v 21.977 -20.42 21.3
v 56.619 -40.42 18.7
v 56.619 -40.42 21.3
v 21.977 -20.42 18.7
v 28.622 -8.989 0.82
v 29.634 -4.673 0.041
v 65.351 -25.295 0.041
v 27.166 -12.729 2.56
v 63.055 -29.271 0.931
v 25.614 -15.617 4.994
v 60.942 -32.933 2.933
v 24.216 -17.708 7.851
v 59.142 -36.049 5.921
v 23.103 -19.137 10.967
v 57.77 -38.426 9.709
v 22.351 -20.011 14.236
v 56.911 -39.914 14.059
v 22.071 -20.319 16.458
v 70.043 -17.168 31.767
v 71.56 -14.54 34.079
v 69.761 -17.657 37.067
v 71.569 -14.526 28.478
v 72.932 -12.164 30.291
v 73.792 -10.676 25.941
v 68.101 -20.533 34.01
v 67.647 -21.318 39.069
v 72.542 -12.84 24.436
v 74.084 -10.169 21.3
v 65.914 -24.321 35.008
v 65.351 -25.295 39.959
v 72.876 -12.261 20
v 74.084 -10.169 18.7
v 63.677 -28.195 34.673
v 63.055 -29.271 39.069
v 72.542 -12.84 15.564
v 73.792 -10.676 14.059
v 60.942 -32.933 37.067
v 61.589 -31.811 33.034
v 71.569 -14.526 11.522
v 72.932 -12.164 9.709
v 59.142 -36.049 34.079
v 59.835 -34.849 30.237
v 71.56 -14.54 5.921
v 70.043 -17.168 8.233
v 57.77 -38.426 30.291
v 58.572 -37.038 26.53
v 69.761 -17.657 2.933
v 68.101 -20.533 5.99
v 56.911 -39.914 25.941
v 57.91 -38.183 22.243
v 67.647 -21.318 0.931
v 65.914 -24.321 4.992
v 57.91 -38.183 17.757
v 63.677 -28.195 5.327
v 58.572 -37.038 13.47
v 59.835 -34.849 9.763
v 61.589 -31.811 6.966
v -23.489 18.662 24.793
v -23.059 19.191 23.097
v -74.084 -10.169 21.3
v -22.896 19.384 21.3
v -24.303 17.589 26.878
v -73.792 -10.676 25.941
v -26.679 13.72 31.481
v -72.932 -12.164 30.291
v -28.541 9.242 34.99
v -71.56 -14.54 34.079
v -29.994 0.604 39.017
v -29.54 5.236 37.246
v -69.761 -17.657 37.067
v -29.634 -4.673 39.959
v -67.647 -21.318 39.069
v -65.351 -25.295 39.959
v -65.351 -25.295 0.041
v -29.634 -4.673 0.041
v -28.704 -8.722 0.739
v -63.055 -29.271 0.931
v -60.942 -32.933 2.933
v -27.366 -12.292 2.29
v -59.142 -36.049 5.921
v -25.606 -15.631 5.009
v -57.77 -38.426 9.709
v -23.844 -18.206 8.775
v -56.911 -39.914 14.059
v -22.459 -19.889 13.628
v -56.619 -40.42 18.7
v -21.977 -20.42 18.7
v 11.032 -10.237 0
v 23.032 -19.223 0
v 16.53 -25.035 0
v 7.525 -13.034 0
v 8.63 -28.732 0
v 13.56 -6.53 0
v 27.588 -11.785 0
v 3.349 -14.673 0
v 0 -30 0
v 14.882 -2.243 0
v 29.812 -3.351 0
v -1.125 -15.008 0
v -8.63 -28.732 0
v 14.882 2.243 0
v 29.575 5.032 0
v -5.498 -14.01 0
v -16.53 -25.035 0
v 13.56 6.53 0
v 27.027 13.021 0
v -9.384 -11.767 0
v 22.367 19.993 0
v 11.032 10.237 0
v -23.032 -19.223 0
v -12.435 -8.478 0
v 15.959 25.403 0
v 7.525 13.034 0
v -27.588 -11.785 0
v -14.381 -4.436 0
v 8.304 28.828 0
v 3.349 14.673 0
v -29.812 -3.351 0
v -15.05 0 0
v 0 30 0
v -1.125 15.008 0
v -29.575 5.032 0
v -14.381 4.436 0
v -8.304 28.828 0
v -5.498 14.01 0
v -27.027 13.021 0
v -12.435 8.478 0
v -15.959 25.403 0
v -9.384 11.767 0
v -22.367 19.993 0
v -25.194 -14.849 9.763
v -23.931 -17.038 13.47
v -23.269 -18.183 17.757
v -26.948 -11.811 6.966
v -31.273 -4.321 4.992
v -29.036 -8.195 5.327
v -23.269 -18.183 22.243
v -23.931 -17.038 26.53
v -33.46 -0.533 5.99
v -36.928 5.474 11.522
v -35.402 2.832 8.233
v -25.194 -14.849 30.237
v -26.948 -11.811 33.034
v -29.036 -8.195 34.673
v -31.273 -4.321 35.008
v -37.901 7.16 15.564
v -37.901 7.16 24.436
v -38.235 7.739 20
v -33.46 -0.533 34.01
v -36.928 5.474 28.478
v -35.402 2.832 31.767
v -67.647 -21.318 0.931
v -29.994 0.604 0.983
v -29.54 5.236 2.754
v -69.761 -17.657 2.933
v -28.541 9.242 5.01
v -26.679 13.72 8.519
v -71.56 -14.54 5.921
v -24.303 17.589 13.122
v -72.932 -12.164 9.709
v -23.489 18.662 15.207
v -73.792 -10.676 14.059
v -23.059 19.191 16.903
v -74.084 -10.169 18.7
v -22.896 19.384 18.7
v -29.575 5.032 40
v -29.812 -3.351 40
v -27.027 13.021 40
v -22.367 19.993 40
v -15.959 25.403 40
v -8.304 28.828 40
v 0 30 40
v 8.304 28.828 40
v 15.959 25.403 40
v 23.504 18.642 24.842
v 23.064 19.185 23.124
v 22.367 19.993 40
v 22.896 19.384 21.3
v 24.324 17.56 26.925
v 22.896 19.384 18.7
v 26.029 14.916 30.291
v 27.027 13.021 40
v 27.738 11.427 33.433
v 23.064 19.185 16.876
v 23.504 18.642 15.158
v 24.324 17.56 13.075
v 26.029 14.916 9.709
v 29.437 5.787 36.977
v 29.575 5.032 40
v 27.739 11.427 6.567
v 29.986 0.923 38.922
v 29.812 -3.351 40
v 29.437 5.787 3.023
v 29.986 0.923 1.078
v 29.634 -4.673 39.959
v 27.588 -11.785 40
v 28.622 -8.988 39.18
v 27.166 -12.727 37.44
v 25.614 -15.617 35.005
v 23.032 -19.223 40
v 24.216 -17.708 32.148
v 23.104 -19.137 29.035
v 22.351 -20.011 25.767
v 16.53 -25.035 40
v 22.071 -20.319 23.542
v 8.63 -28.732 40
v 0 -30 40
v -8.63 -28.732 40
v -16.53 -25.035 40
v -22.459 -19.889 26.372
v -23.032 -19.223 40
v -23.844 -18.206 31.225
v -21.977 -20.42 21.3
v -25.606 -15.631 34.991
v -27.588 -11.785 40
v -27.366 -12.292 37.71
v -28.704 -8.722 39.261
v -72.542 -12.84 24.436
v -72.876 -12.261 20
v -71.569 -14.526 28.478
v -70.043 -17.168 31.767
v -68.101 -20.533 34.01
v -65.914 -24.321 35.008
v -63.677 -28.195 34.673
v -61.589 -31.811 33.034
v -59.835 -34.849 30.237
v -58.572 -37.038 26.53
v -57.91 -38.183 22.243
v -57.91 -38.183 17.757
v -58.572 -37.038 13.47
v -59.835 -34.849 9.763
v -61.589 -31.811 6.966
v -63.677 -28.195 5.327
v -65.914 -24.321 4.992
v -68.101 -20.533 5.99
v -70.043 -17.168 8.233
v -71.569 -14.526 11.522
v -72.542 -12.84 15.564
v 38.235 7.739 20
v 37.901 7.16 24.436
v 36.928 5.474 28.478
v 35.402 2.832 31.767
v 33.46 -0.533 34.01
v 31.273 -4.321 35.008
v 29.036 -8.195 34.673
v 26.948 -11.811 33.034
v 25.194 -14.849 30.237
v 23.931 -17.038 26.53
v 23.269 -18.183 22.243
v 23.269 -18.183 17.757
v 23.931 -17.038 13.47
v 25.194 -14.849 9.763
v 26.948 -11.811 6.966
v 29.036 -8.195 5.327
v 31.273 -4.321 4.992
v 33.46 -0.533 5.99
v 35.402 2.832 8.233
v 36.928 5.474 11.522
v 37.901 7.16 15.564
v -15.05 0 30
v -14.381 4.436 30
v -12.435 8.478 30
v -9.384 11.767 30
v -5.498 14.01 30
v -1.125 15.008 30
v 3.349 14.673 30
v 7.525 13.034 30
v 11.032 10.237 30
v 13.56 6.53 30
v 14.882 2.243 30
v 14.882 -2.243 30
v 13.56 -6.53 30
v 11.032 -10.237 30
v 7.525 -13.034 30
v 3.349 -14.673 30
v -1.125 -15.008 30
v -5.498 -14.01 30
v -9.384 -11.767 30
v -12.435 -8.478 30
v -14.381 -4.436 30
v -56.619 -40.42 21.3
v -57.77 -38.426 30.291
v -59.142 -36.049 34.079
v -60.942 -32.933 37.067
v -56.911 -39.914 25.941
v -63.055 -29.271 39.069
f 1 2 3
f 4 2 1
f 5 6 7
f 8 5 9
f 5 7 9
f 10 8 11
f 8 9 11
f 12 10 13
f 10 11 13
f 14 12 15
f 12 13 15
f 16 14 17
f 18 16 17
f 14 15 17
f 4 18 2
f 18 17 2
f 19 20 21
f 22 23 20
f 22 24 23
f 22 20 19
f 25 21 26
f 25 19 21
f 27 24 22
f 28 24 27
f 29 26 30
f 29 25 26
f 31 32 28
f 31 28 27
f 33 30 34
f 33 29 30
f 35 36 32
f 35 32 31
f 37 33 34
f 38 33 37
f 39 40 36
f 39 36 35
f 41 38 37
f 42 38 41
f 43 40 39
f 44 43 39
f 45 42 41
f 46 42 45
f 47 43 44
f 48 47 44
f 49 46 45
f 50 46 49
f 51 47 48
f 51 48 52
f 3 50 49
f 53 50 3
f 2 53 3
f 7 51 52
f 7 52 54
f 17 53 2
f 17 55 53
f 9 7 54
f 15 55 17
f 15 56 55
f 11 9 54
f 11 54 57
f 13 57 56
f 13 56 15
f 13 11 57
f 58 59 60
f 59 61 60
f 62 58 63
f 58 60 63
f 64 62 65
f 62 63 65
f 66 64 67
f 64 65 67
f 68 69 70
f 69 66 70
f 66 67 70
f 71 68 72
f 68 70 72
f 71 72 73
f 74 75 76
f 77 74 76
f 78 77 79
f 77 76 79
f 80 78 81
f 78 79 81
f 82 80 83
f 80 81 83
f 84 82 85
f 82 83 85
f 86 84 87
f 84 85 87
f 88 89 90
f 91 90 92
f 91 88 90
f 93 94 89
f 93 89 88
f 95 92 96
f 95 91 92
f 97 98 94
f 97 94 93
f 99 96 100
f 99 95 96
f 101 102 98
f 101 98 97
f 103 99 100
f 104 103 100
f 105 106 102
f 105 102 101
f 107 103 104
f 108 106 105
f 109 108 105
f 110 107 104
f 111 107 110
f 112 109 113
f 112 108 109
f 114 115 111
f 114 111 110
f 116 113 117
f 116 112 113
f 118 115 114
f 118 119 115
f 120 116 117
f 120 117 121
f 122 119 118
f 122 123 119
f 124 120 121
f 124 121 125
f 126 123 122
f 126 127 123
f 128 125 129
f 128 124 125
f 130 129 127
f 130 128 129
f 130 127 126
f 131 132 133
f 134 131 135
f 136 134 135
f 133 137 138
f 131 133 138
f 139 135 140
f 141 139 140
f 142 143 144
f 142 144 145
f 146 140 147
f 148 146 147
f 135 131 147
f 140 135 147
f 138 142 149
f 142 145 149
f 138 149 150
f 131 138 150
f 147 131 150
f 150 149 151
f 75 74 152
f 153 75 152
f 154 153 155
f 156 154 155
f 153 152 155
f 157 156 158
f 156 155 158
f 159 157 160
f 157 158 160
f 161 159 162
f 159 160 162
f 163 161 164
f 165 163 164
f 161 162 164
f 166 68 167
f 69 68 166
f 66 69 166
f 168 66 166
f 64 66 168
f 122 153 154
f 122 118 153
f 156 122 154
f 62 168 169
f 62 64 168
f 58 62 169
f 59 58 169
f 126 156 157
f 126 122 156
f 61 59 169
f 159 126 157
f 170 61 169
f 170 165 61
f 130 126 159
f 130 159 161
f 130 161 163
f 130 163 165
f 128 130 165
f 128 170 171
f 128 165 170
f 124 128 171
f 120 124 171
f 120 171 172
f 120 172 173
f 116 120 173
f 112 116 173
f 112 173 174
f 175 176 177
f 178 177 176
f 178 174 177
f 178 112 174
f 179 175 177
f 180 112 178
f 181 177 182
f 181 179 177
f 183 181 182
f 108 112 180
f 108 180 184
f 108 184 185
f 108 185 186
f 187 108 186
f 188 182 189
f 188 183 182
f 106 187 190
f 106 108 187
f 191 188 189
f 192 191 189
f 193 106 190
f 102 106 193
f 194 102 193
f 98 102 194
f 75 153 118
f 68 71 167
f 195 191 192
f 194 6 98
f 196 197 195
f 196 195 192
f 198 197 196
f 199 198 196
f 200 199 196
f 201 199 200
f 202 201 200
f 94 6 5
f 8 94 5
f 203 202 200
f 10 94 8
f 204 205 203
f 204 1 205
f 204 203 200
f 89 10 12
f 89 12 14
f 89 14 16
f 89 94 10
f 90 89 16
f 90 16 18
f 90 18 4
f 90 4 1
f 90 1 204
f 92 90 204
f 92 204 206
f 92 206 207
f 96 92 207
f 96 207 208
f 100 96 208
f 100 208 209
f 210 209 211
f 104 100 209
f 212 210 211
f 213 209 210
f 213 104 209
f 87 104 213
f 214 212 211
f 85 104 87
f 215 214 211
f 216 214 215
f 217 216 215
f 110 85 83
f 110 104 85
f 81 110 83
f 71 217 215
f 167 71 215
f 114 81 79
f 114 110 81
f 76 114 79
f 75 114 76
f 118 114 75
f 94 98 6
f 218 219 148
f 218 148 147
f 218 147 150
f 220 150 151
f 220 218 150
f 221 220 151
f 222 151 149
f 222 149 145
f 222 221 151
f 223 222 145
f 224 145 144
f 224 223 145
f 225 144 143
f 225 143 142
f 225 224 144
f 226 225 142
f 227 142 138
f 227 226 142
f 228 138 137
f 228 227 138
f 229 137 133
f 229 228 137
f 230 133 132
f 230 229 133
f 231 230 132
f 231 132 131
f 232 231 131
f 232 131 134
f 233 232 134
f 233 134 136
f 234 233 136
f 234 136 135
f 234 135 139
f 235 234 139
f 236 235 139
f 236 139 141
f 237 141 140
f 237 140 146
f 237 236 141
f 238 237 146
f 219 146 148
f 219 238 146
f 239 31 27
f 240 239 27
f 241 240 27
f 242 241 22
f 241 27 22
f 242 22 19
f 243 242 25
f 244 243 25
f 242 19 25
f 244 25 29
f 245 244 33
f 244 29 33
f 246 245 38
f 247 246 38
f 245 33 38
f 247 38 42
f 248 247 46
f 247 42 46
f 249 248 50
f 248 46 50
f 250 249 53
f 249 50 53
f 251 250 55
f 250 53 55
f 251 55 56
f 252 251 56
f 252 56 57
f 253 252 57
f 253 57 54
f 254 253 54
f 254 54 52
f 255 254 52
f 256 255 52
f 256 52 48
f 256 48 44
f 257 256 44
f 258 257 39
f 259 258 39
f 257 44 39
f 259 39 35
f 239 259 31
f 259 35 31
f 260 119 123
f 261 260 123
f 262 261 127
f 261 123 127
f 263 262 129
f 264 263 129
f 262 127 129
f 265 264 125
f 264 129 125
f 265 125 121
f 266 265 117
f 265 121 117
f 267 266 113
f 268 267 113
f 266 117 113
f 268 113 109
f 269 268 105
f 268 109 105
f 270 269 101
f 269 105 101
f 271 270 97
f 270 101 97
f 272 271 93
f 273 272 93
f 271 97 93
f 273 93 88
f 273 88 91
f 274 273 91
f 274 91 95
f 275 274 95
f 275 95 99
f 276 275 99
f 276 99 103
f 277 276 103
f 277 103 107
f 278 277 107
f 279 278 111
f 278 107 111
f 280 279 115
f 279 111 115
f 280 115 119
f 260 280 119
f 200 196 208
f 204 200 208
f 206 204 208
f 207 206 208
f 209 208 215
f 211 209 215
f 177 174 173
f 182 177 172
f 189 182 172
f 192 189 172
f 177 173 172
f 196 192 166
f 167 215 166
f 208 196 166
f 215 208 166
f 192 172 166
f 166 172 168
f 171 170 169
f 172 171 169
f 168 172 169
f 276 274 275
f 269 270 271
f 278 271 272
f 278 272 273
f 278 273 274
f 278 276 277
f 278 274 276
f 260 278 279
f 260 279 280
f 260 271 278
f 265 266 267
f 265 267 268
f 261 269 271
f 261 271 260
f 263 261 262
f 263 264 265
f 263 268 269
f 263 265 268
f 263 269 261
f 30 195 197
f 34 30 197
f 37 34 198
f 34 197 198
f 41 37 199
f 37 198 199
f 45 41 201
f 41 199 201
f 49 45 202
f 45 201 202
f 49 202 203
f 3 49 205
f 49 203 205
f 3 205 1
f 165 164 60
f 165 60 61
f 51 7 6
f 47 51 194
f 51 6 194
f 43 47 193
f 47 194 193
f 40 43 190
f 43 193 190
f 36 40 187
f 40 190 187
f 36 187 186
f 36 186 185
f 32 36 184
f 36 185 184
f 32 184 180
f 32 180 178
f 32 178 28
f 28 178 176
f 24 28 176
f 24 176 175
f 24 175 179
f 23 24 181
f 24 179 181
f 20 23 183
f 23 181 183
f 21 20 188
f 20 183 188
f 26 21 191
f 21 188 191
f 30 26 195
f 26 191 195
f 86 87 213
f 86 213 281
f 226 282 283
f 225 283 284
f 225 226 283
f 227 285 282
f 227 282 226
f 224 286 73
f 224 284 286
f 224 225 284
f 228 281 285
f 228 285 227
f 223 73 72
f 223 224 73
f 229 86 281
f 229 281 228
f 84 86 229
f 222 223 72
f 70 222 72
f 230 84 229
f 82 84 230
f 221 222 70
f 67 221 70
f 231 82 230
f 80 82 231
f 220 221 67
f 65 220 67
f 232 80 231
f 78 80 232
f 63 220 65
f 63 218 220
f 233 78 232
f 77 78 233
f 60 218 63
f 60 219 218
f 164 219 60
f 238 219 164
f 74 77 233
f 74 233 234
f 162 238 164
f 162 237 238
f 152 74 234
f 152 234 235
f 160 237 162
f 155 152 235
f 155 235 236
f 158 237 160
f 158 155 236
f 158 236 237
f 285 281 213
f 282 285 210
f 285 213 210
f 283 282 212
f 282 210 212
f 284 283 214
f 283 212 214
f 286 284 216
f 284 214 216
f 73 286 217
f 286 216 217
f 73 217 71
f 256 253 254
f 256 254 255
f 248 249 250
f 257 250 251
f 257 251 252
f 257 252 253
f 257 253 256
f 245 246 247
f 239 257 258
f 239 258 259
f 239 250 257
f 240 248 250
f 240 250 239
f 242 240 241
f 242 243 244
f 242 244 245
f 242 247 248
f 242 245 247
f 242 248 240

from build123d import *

# Parameters (mm, degrees)
BOSS_EXTRUDE1_DEPTH = 40
SKETCH2_R           = 15.049999999999999
CUT_EXTRUDE1_DEPTH  = 40
FILLET3_R           = 18.700000000000003
FILLET4_R           = 18.7
FILLET5_R           = 18.7
FILLET6_R           = 18.7
SKETCH4_R           = 15.049999999999999
CUT_EXTRUDE2_DEPTH  = 30


with BuildPart() as part:
    # Sketch1 → Boss-Extrude1 (new body)
    with BuildSketch(Plane.XY):
        with BuildLine():
            Line((-21.97749224689504, -20.420328952729147), (-56.618508398272695, -40.420328952728944))
            Line((-56.618508398272695, -40.420328952728944), (-74.08417498363409, -10.168907038824594))
            Line((-74.08417498363409, -10.168907038824594), (-22.896447841875652, 19.38434100567434))
            ThreePointArc((-22.896447841875652, 19.38434100567434), (1.84e-15, 30), (22.89644784187566, 19.384341005674337))
            Line((22.89644784187566, 19.384341005674337), (74.08417498363407, -10.168907038825086))
            Line((74.08417498363407, -10.168907038825086), (56.61850839827255, -40.42032895272918))
            Line((56.61850839827255, -40.42032895272918), (21.97749224689504, -20.42032895272915))
            ThreePointArc((21.97749224689504, -20.42032895272915), (-4.82e-15, -29.999999999999996), (-21.97749224689504, -20.420328952729147))
        make_face()
    extrude(amount=BOSS_EXTRUDE1_DEPTH)

    # Sketch2 → Cut-Extrude1 (cut)
    with BuildSketch(Plane(origin=(59.96639714989796, -34.62161553682567, 0), x_dir=(0, 0, -1), z_dir=(0.8660254037844382, -0.5000000000000009, 0))):
        with Locations(Location((-20, 10.769889082110701, 0), (0, 0, 90))):
            Circle(SKETCH2_R)
    cut_extrude1 = extrude(amount=-CUT_EXTRUDE1_DEPTH, mode=Mode.SUBTRACT)

    # Mirror1: Cut-Extrude1 across plane
    add(cut_extrude1.mirror(Plane(origin=(0, 0, 0), x_dir=(0, 0, 1), z_dir=(1, 0, 0))), mode=Mode.SUBTRACT)

    # Fillet3
    fillet3_edges = [part.edges().sort_by_distance(p)[0] for p in [
        (39.298000322583796, -30.420328952729164, 40),
    ]]
    fillet(fillet3_edges, radius=FILLET3_R)

    # Fillet4
    # the kernel refuses this fillet: 18.7 mm, written as the material it takes off along each edge
    with BuildSketch(Plane(origin=(-17.590239785046823, 42.759341005674386, 40), x_dir=(0, 0, -1), z_dir=(0.866025403784438, -0.5000000000000011, 0))) as fillet4_piece_1_section:
        with BuildLine():
            CenterArc((FILLET4_R, -FILLET4_R), FILLET4_R, 90, 89.99999999999997)
            Line((0, -FILLET4_R), (0, 0))
            Line((0, 0), (FILLET4_R, 0))
        make_face()
    fillet4_piece_1 = extrude(amount=152.6064960889987, mode=Mode.PRIVATE)
    fillet4_piece_1 = fillet4_piece_1 - Plane(origin=(2.66e-15, 5.33e-15, 35.12262503865641), x_dir=(-0.7632149280625219, 0.6461447001891446, 0), z_dir=(0, 0, -1)) * Cylinder(29.999999999999996, 381, mode=Mode.PRIVATE)
    add(fillet4_piece_1, mode=Mode.SUBTRACT)
    with BuildSketch(Plane(origin=(18.509195380027606, 2.9546710472706206, 0), x_dir=(-0.49999999999999495, 0.8660254037844416, 0), z_dir=(-0.8660254037844416, -0.499999999999995, 0))) as fillet4_piece_2_section:
        with BuildLine():
            CenterArc((FILLET4_R, -FILLET4_R), FILLET4_R, 90, 90)
            Line((-2.49e-15, -FILLET4_R), (0, 0))
            Line((0, 0), (FILLET4_R, 0))
        make_face()
    fillet4_piece_2 = extrude(amount=133.50000000000003, mode=Mode.PRIVATE)
    fillet4_piece_2 = fillet4_piece_2 - Plane(origin=(8.9e-16, 5.33e-15, 4.238028125601217), x_dir=(0.7325830748965012, -0.6806776317576385, 0), z_dir=(0, 0, -1)) * Cylinder(30, 342, mode=Mode.PRIVATE)
    add(fillet4_piece_2, mode=Mode.SUBTRACT)
    with BuildSketch(Plane(origin=(97.10519602519503, -63.795328952729214, 0), x_dir=(0.5000000000000009, 0.8660254037844382, 0), z_dir=(-0.8660254037844382, 0.5000000000000009, 0))) as fillet4_piece_3_section:
        with BuildLine():
            CenterArc((FILLET4_R, -FILLET4_R), FILLET4_R, 90, 90)
            Line((0, -FILLET4_R), (0, 0))
            Line((0, 0), (FILLET4_R, 0))
        make_face()
    fillet4_piece_3 = extrude(amount=133.49999999999997, mode=Mode.PRIVATE)
    fillet4_piece_3 = fillet4_piece_3 - Plane(origin=(8.9e-16, 5.33e-15, 4.238027498797153), x_dir=(0.7325830748965012, -0.6806776317576385, 0), z_dir=(0, 0, -1)) * Cylinder(30, 342, mode=Mode.PRIVATE)
    add(fillet4_piece_3, mode=Mode.SUBTRACT)

    # Fillet5
    # the kernel refuses this fillet: 18.7 mm, written as the material it takes off along each edge
    with BuildSketch(Plane(origin=(-114.57086261055673, -33.54390703882436, 0), x_dir=(0.4999999999999949, -0.8660254037844416, 0), z_dir=(0.8660254037844416, 0.49999999999999484, 0))) as fillet5_piece_1_section:
        with BuildLine():
            CenterArc((FILLET5_R, -FILLET5_R), FILLET5_R, 90, 90)
            Line((0, -FILLET5_R), (0, 0))
            Line((0, 0), (FILLET5_R, 0))
        make_face()
    fillet5_piece_1 = extrude(amount=152.6064960889985, mode=Mode.PRIVATE)
    fillet5_piece_1 = fillet5_piece_1 - Plane(origin=(8.9e-16, 5.33e-15, 4.361975698368192), x_dir=(0.7325830748965012, -0.6806776317576385, 0), z_dir=(0, 0, -1)) * Cylinder(30, 381, mode=Mode.PRIVATE)
    with BuildSketch(Plane(origin=(18.509195380027606, 2.954671047270619, 40), x_dir=(1e-17, -2e-17, -1), z_dir=(-0.8660254037844416, -0.499999999999995, 0))) as fillet5_piece_2_section:
        with BuildLine():
            CenterArc((FILLET5_R, -FILLET5_R), FILLET5_R, 90, 90)
            Line((-4.8e-16, -FILLET5_R), (0, 0))
            Line((0, 0), (FILLET5_R, 0))
        make_face()
    fillet5_piece_2 = extrude(amount=133.50000000000003, mode=Mode.PRIVATE)
    fillet5_piece_2 = fillet5_piece_2 - Plane(origin=(8.9e-16, 5.33e-15, 35.76197179193409), x_dir=(0.7325830748965012, -0.6806776317576385, 0), z_dir=(0, 0, -1)) * Cylinder(30, 342, mode=Mode.PRIVATE)
    with BuildSketch(Plane(origin=(-17.590239785046823, 42.759341005674386, 0), x_dir=(0, 0, 1), z_dir=(0.866025403784438, -0.5000000000000011, 0))) as fillet5_piece_3_section:
        with BuildLine():
            CenterArc((FILLET5_R, FILLET5_R), FILLET5_R, 180.00000000000003, 90)
            Line((-3.55e-15, FILLET5_R), (0, 0))
            Line((0, 0), (FILLET5_R, 0))
        make_face()
    fillet5_piece_3 = extrude(amount=152.6064960889987, mode=Mode.PRIVATE)
    fillet5_piece_3 = fillet5_piece_3 - Plane(origin=(8.9e-16, 5.33e-15, 4.877369917658315), x_dir=(0.7325830748965012, -0.6806776317576385, 0), z_dir=(0, 0, -1)) * Cylinder(30, 381, mode=Mode.PRIVATE)
    add([fillet5_piece_1, fillet5_piece_2, fillet5_piece_3], mode=Mode.SUBTRACT)

    # Fillet6
    # the kernel refuses this fillet: 18.7 mm, written as the material it takes off along each edge
    with BuildSketch(Plane(origin=(-114.57086261055673, -33.54390703882436, 40), x_dir=(0.4999999999999949, -0.8660254037844416, 0), z_dir=(0.8660254037844416, 0.49999999999999484, 0))) as fillet6_piece_1_section:
        with BuildLine():
            CenterArc((FILLET6_R, FILLET6_R), FILLET6_R, 180, 90)
            Line((0, FILLET6_R), (0, 0))
            Line((0, 0), (FILLET6_R, 0))
        make_face()
    fillet6_piece_1 = extrude(amount=152.6064960889985, mode=Mode.PRIVATE)
    fillet6_piece_1 = fillet6_piece_1 - Plane(origin=(8.9e-16, 5.33e-15, 35.63802430163197), x_dir=(0.7325830748965012, -0.6806776317576385, 0), z_dir=(0, 0, -1)) * Cylinder(30, 381, mode=Mode.PRIVATE)
    add(fillet6_piece_1, mode=Mode.SUBTRACT)

    # Sketch4 → Cut-Extrude2 (cut)
    with BuildSketch(Plane(origin=(0, 0, 0), x_dir=(-1, 0, 0), z_dir=(0, 0, -1))):
        Circle(SKETCH4_R)
    extrude(amount=-CUT_EXTRUDE2_DEPTH, mode=Mode.SUBTRACT)


solid = part.part
